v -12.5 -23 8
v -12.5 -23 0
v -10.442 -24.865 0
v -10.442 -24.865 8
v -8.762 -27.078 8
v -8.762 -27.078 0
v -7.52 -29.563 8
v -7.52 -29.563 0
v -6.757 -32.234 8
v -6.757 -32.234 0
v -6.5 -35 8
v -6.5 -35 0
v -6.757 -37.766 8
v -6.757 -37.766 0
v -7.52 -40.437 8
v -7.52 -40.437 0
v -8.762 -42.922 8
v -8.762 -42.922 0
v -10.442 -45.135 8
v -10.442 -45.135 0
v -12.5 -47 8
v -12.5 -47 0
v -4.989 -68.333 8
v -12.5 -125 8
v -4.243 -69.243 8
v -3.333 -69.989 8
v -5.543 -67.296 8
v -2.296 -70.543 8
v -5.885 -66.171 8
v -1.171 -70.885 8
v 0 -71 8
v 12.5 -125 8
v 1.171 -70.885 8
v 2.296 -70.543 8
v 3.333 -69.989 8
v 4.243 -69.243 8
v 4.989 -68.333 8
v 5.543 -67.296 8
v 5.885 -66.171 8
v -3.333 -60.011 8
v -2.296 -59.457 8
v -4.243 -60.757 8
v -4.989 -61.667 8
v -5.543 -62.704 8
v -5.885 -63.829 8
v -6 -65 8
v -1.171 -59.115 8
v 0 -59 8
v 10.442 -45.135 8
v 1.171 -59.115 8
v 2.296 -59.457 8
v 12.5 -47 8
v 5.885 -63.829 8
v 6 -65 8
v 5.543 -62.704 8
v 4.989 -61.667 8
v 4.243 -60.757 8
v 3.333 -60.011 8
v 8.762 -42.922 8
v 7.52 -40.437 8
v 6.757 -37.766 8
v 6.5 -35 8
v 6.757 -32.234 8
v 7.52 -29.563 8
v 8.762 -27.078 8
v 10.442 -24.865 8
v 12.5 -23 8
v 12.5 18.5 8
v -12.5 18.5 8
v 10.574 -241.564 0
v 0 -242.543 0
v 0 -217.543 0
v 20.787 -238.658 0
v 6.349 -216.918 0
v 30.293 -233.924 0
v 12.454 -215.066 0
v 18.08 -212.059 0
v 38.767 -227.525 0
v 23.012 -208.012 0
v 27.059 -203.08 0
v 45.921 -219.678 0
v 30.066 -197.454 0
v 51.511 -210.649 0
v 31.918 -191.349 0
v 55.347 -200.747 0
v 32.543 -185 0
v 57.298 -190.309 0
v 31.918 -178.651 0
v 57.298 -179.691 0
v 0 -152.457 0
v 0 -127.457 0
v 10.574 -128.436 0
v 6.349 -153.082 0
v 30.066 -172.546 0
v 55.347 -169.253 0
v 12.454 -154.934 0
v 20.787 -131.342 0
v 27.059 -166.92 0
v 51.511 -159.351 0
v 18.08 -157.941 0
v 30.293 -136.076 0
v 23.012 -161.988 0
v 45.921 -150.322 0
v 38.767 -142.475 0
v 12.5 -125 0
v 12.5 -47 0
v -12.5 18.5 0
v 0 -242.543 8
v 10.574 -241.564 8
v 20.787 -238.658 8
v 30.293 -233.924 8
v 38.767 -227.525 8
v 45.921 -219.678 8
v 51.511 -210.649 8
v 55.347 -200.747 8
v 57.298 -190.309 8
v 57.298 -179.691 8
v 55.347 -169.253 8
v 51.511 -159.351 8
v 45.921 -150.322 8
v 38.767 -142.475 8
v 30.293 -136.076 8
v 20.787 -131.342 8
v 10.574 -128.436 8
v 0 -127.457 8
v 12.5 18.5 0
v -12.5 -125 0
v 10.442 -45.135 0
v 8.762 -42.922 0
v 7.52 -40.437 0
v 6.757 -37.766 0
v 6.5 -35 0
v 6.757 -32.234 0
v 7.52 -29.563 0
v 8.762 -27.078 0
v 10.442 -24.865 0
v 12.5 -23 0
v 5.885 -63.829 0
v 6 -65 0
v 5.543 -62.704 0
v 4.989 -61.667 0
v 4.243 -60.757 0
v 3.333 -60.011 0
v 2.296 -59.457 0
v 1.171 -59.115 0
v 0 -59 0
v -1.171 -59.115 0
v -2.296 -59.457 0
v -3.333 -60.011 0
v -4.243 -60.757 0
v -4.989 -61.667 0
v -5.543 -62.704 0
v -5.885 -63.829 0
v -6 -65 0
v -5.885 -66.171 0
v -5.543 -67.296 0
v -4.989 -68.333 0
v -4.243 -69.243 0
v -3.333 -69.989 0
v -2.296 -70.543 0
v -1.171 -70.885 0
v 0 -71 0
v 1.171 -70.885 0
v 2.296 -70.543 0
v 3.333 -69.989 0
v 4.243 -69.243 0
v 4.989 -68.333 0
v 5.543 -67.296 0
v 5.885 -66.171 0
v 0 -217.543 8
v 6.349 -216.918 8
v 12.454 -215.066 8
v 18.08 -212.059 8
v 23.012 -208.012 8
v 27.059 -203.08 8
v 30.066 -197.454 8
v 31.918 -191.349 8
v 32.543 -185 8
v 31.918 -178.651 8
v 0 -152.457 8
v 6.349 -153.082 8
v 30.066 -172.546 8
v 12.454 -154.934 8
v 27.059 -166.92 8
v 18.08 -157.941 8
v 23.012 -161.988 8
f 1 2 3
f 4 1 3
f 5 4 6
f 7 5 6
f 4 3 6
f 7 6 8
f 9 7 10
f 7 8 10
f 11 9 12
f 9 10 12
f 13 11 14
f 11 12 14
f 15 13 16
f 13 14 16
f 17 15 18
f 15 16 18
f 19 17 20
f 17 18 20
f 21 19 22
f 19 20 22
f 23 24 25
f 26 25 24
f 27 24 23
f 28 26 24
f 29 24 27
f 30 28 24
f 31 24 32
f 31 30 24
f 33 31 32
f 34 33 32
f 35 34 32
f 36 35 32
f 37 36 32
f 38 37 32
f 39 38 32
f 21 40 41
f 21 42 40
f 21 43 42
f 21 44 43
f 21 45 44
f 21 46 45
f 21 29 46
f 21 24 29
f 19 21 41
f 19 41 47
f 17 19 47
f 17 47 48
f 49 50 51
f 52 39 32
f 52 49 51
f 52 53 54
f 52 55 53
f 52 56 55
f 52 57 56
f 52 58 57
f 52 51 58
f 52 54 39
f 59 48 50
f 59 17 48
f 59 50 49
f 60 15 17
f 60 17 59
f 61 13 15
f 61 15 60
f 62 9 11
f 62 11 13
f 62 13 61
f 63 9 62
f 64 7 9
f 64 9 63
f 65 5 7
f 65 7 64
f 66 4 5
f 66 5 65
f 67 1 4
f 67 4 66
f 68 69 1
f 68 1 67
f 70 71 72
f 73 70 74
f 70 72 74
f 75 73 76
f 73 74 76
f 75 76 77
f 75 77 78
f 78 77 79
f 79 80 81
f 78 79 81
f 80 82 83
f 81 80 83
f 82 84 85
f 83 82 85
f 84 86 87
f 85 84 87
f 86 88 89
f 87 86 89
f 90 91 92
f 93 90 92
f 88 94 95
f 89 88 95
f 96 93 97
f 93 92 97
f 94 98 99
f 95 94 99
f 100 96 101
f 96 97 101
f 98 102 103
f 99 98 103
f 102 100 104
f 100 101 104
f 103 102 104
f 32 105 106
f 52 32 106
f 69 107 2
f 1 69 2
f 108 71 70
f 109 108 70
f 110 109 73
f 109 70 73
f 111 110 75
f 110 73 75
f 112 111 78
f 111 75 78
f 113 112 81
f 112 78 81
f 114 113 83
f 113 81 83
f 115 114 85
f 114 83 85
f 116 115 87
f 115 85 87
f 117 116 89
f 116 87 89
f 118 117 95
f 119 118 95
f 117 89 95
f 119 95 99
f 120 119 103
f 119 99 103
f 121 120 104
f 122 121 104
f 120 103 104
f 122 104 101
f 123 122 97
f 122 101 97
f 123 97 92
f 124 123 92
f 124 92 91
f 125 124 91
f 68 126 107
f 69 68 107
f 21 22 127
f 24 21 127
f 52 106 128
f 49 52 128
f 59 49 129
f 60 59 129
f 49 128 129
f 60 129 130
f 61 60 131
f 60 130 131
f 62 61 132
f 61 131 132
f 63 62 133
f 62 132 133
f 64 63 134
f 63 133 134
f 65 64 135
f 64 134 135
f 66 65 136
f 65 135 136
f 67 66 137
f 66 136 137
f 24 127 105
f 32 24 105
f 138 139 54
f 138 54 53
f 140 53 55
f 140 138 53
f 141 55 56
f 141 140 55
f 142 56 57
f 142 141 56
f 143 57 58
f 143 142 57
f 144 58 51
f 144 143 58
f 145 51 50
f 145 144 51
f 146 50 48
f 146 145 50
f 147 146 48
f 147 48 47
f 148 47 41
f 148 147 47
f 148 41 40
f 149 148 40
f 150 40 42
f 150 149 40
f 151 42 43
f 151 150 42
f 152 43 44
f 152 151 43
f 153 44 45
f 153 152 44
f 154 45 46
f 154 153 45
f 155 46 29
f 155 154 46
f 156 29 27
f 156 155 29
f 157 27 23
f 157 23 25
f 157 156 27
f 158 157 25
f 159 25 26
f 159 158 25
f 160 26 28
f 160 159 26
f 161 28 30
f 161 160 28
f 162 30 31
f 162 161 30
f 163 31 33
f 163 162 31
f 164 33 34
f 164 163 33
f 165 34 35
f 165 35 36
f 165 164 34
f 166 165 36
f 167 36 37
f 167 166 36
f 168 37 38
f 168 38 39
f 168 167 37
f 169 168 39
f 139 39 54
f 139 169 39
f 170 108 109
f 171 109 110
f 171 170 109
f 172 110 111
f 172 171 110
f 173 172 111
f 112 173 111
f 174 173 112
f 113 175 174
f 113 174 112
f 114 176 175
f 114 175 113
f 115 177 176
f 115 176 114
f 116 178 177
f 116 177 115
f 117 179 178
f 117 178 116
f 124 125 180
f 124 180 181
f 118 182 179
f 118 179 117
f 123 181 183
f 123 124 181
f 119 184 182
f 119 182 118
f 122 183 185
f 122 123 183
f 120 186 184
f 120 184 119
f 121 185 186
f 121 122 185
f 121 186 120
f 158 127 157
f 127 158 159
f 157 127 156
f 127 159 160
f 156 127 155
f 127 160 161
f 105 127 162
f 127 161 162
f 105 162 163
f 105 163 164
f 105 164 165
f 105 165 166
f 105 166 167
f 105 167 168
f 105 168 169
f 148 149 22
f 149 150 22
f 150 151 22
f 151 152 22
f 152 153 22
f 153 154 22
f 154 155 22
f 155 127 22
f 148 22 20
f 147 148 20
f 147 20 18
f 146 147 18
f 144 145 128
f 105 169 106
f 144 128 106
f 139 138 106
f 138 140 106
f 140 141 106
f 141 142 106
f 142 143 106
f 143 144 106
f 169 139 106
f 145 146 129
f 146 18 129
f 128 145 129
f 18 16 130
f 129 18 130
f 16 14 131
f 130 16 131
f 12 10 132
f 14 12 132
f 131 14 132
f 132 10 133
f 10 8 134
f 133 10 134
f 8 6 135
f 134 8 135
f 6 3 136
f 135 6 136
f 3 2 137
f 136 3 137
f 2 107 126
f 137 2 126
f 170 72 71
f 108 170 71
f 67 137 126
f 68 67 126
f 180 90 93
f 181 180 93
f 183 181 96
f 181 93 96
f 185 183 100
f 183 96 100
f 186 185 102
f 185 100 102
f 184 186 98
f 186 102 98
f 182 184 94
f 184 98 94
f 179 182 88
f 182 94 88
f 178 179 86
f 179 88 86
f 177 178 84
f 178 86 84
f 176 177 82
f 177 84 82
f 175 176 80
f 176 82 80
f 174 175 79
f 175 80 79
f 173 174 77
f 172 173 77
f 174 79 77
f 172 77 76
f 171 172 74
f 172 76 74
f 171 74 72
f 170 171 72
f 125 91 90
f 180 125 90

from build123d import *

# Parameters (mm, degrees)
SKETCH1_R             = 6
BOSS_EXTRUDE1_DEPTH   = 8
BOSS_EXTRUDE1_2_DEPTH = 8


with BuildPart() as part:
    # Sketch1 → Boss-Extrude1 (new body)
    with BuildSketch(Plane.XY):
        with BuildLine():
            Line((-12.5, -13.638181697), (-12.5, -23))
            ThreePointArc((-12.5, -23), (-6.5, -35), (-12.5, -47))
            Line((-12.5, -47), (-12.5, -125))
            Line((-12.5, -125), (12.5, -125))
            Line((12.5, -125), (12.5, -47))
            ThreePointArc((12.5, -47), (6.5, -35), (12.5, -23))
            Line((12.5, -23), (12.5, -13.638181697))
            Line((12.5, -13.638181697), (12.5, 18.5))
            Line((12.5, 18.5), (-12.5, 18.5))
            Line((-12.5, 18.5), (-12.5, -13.638181697))
        make_face()
        with Locations((0, -65)):
            Circle(SKETCH1_R, mode=Mode.SUBTRACT)
    extrude(amount=BOSS_EXTRUDE1_DEPTH)


with BuildPart() as body_2:
    # Sketch1 → Boss-Extrude1 2 (new body)
    with BuildSketch(Plane.XY):
        with BuildLine():
            Line((0, -127.456671403), (0, -152.456671403))
            ThreePointArc((0, -152.456671403), (32.543328597, -185), (0, -217.543328597))
            Line((0, -217.543328597), (0, -242.543328597))
            ThreePointArc((0, -242.543328597), (57.543328597, -185), (0, -127.456671403))
        make_face()
    extrude(amount=BOSS_EXTRUDE1_2_DEPTH)


solid = Compound([part.part, body_2.part])
